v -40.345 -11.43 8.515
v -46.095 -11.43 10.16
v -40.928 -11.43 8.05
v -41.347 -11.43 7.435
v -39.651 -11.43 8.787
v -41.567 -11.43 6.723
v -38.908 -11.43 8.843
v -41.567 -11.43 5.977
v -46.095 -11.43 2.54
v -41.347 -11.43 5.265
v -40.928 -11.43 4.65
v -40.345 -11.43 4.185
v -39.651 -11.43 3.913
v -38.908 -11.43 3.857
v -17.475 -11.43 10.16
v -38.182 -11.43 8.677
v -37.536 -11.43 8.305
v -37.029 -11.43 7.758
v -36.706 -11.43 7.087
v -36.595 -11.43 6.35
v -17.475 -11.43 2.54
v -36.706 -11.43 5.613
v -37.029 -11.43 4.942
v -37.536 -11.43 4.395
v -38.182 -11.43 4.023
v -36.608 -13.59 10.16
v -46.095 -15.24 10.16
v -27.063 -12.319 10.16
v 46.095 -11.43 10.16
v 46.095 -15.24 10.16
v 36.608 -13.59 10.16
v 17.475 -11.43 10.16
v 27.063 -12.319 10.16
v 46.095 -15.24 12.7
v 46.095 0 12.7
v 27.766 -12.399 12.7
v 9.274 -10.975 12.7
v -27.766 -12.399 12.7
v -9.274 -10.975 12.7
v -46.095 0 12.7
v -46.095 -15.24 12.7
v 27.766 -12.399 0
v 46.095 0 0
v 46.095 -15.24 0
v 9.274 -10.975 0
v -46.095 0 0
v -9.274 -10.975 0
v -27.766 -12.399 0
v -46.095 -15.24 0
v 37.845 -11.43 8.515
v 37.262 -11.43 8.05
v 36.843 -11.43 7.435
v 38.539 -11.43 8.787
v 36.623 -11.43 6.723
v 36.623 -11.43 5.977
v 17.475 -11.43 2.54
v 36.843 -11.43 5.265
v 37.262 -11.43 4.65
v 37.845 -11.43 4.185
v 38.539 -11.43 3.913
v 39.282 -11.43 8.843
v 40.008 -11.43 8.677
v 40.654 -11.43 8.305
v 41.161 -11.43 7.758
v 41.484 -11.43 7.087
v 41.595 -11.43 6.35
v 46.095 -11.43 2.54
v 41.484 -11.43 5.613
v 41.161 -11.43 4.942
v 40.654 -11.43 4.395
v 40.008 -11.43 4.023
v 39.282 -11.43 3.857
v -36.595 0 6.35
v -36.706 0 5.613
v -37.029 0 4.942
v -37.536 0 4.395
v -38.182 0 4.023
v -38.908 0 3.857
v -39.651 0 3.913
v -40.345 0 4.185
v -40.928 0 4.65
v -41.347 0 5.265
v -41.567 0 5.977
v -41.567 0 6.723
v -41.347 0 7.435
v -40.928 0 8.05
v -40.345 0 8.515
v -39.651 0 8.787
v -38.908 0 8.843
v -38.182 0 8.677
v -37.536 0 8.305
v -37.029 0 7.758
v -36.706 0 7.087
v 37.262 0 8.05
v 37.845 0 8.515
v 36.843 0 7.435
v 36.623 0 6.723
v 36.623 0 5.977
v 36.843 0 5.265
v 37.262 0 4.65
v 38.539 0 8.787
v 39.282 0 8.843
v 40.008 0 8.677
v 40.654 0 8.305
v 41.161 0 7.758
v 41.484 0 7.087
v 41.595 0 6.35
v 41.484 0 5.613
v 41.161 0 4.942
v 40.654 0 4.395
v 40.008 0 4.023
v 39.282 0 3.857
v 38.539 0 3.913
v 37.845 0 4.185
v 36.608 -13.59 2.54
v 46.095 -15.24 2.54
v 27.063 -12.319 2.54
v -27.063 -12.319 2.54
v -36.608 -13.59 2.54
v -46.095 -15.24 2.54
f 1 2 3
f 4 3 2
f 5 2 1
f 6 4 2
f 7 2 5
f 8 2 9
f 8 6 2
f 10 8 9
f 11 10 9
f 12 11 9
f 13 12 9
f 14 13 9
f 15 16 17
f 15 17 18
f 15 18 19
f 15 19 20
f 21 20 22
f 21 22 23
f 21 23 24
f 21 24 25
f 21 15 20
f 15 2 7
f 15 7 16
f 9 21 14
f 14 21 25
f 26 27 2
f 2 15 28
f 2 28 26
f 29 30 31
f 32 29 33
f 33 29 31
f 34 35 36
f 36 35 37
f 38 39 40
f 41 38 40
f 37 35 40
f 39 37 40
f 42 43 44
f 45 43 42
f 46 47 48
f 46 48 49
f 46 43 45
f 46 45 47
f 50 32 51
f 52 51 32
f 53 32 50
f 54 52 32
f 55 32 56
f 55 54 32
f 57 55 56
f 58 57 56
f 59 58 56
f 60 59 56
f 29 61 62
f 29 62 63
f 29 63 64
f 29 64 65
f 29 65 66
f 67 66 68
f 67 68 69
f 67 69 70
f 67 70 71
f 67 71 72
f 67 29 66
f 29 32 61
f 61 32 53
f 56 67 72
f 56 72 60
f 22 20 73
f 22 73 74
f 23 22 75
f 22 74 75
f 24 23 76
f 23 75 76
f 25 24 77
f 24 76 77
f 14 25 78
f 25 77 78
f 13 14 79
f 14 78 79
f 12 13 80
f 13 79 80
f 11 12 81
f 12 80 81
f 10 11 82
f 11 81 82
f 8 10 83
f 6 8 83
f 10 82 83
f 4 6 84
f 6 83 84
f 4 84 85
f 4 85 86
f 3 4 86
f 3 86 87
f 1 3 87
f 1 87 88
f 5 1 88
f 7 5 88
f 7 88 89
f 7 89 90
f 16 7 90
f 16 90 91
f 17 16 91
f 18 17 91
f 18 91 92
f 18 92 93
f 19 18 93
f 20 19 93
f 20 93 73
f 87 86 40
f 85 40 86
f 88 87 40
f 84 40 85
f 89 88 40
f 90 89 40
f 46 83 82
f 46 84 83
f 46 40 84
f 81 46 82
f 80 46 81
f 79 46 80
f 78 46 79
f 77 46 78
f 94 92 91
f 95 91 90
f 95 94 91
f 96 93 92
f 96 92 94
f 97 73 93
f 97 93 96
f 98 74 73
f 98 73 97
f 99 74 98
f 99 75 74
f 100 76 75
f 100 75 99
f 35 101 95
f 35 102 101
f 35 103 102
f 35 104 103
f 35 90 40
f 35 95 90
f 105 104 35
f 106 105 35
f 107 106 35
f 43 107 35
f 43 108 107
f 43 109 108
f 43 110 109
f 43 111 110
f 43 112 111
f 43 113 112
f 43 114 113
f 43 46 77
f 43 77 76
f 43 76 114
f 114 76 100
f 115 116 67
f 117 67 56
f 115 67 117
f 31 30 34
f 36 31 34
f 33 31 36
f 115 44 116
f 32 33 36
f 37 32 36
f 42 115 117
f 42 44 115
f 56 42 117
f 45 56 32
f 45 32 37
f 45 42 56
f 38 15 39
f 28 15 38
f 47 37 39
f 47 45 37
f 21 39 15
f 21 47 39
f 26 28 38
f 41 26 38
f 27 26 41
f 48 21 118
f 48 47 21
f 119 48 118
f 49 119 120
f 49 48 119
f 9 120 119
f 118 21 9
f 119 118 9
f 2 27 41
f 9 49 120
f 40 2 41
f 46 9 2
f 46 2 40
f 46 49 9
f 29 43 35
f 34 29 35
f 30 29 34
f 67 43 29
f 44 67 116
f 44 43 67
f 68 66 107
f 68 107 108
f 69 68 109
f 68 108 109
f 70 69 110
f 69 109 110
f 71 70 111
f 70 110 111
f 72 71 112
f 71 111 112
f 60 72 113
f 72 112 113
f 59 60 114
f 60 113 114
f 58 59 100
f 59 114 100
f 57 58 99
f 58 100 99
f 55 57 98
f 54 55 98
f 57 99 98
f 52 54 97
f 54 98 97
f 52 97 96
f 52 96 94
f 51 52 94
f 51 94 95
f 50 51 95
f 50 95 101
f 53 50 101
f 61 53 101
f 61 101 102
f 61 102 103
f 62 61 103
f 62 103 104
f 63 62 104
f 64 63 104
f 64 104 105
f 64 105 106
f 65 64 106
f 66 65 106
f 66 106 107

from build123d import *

# Parameters (mm, degrees)
BOSS_EXTRUDE1_DEPTH = 12.7
SKETCH2_R           = 2.5
CUT_EXTRUDE1_DEPTH  = 16.24
SKETCH3_W           = 7.62
SKETCH3_H           = 3.81
CUT_EXTRUDE2_DEPTH  = 93.1900001


with BuildPart() as part:
    # Sketch1 → Boss-Extrude1 (new body)
    with BuildSketch(Plane.XY):
        with BuildLine():
            Line((-46.095, 0), (46.095, 0))
            Line((46.095, 0), (46.095, -15.24))
            ThreePointArc((46.095, -15.24), (0, -10.796372038), (-46.095, -15.24))
            Line((-46.095, -15.24), (-46.095, 0))
        make_face()
    extrude(amount=BOSS_EXTRUDE1_DEPTH)

    # Sketch2 → Cut-Extrude1 (cut, through all)
    with BuildSketch(Plane(origin=(0, 0, 0), x_dir=(1, 0, 0), z_dir=(0, 1, 0))):
        with Locations((-39.095, -6.35)):
            Circle(SKETCH2_R)
        with Locations((39.095, -6.35)):
            Circle(SKETCH2_R)
    extrude(amount=-CUT_EXTRUDE1_DEPTH, mode=Mode.SUBTRACT)

    # Sketch3 → Cut-Extrude2 (cut, through all)
    with BuildSketch(Plane(origin=(46.095, 0, 0), x_dir=(0, 0, -1), z_dir=(1, 0, 0))):
        with Locations((-6.35, -13.335)):
            Rectangle(SKETCH3_W, SKETCH3_H)
    extrude(amount=-CUT_EXTRUDE2_DEPTH, mode=Mode.SUBTRACT)


solid = part.part
